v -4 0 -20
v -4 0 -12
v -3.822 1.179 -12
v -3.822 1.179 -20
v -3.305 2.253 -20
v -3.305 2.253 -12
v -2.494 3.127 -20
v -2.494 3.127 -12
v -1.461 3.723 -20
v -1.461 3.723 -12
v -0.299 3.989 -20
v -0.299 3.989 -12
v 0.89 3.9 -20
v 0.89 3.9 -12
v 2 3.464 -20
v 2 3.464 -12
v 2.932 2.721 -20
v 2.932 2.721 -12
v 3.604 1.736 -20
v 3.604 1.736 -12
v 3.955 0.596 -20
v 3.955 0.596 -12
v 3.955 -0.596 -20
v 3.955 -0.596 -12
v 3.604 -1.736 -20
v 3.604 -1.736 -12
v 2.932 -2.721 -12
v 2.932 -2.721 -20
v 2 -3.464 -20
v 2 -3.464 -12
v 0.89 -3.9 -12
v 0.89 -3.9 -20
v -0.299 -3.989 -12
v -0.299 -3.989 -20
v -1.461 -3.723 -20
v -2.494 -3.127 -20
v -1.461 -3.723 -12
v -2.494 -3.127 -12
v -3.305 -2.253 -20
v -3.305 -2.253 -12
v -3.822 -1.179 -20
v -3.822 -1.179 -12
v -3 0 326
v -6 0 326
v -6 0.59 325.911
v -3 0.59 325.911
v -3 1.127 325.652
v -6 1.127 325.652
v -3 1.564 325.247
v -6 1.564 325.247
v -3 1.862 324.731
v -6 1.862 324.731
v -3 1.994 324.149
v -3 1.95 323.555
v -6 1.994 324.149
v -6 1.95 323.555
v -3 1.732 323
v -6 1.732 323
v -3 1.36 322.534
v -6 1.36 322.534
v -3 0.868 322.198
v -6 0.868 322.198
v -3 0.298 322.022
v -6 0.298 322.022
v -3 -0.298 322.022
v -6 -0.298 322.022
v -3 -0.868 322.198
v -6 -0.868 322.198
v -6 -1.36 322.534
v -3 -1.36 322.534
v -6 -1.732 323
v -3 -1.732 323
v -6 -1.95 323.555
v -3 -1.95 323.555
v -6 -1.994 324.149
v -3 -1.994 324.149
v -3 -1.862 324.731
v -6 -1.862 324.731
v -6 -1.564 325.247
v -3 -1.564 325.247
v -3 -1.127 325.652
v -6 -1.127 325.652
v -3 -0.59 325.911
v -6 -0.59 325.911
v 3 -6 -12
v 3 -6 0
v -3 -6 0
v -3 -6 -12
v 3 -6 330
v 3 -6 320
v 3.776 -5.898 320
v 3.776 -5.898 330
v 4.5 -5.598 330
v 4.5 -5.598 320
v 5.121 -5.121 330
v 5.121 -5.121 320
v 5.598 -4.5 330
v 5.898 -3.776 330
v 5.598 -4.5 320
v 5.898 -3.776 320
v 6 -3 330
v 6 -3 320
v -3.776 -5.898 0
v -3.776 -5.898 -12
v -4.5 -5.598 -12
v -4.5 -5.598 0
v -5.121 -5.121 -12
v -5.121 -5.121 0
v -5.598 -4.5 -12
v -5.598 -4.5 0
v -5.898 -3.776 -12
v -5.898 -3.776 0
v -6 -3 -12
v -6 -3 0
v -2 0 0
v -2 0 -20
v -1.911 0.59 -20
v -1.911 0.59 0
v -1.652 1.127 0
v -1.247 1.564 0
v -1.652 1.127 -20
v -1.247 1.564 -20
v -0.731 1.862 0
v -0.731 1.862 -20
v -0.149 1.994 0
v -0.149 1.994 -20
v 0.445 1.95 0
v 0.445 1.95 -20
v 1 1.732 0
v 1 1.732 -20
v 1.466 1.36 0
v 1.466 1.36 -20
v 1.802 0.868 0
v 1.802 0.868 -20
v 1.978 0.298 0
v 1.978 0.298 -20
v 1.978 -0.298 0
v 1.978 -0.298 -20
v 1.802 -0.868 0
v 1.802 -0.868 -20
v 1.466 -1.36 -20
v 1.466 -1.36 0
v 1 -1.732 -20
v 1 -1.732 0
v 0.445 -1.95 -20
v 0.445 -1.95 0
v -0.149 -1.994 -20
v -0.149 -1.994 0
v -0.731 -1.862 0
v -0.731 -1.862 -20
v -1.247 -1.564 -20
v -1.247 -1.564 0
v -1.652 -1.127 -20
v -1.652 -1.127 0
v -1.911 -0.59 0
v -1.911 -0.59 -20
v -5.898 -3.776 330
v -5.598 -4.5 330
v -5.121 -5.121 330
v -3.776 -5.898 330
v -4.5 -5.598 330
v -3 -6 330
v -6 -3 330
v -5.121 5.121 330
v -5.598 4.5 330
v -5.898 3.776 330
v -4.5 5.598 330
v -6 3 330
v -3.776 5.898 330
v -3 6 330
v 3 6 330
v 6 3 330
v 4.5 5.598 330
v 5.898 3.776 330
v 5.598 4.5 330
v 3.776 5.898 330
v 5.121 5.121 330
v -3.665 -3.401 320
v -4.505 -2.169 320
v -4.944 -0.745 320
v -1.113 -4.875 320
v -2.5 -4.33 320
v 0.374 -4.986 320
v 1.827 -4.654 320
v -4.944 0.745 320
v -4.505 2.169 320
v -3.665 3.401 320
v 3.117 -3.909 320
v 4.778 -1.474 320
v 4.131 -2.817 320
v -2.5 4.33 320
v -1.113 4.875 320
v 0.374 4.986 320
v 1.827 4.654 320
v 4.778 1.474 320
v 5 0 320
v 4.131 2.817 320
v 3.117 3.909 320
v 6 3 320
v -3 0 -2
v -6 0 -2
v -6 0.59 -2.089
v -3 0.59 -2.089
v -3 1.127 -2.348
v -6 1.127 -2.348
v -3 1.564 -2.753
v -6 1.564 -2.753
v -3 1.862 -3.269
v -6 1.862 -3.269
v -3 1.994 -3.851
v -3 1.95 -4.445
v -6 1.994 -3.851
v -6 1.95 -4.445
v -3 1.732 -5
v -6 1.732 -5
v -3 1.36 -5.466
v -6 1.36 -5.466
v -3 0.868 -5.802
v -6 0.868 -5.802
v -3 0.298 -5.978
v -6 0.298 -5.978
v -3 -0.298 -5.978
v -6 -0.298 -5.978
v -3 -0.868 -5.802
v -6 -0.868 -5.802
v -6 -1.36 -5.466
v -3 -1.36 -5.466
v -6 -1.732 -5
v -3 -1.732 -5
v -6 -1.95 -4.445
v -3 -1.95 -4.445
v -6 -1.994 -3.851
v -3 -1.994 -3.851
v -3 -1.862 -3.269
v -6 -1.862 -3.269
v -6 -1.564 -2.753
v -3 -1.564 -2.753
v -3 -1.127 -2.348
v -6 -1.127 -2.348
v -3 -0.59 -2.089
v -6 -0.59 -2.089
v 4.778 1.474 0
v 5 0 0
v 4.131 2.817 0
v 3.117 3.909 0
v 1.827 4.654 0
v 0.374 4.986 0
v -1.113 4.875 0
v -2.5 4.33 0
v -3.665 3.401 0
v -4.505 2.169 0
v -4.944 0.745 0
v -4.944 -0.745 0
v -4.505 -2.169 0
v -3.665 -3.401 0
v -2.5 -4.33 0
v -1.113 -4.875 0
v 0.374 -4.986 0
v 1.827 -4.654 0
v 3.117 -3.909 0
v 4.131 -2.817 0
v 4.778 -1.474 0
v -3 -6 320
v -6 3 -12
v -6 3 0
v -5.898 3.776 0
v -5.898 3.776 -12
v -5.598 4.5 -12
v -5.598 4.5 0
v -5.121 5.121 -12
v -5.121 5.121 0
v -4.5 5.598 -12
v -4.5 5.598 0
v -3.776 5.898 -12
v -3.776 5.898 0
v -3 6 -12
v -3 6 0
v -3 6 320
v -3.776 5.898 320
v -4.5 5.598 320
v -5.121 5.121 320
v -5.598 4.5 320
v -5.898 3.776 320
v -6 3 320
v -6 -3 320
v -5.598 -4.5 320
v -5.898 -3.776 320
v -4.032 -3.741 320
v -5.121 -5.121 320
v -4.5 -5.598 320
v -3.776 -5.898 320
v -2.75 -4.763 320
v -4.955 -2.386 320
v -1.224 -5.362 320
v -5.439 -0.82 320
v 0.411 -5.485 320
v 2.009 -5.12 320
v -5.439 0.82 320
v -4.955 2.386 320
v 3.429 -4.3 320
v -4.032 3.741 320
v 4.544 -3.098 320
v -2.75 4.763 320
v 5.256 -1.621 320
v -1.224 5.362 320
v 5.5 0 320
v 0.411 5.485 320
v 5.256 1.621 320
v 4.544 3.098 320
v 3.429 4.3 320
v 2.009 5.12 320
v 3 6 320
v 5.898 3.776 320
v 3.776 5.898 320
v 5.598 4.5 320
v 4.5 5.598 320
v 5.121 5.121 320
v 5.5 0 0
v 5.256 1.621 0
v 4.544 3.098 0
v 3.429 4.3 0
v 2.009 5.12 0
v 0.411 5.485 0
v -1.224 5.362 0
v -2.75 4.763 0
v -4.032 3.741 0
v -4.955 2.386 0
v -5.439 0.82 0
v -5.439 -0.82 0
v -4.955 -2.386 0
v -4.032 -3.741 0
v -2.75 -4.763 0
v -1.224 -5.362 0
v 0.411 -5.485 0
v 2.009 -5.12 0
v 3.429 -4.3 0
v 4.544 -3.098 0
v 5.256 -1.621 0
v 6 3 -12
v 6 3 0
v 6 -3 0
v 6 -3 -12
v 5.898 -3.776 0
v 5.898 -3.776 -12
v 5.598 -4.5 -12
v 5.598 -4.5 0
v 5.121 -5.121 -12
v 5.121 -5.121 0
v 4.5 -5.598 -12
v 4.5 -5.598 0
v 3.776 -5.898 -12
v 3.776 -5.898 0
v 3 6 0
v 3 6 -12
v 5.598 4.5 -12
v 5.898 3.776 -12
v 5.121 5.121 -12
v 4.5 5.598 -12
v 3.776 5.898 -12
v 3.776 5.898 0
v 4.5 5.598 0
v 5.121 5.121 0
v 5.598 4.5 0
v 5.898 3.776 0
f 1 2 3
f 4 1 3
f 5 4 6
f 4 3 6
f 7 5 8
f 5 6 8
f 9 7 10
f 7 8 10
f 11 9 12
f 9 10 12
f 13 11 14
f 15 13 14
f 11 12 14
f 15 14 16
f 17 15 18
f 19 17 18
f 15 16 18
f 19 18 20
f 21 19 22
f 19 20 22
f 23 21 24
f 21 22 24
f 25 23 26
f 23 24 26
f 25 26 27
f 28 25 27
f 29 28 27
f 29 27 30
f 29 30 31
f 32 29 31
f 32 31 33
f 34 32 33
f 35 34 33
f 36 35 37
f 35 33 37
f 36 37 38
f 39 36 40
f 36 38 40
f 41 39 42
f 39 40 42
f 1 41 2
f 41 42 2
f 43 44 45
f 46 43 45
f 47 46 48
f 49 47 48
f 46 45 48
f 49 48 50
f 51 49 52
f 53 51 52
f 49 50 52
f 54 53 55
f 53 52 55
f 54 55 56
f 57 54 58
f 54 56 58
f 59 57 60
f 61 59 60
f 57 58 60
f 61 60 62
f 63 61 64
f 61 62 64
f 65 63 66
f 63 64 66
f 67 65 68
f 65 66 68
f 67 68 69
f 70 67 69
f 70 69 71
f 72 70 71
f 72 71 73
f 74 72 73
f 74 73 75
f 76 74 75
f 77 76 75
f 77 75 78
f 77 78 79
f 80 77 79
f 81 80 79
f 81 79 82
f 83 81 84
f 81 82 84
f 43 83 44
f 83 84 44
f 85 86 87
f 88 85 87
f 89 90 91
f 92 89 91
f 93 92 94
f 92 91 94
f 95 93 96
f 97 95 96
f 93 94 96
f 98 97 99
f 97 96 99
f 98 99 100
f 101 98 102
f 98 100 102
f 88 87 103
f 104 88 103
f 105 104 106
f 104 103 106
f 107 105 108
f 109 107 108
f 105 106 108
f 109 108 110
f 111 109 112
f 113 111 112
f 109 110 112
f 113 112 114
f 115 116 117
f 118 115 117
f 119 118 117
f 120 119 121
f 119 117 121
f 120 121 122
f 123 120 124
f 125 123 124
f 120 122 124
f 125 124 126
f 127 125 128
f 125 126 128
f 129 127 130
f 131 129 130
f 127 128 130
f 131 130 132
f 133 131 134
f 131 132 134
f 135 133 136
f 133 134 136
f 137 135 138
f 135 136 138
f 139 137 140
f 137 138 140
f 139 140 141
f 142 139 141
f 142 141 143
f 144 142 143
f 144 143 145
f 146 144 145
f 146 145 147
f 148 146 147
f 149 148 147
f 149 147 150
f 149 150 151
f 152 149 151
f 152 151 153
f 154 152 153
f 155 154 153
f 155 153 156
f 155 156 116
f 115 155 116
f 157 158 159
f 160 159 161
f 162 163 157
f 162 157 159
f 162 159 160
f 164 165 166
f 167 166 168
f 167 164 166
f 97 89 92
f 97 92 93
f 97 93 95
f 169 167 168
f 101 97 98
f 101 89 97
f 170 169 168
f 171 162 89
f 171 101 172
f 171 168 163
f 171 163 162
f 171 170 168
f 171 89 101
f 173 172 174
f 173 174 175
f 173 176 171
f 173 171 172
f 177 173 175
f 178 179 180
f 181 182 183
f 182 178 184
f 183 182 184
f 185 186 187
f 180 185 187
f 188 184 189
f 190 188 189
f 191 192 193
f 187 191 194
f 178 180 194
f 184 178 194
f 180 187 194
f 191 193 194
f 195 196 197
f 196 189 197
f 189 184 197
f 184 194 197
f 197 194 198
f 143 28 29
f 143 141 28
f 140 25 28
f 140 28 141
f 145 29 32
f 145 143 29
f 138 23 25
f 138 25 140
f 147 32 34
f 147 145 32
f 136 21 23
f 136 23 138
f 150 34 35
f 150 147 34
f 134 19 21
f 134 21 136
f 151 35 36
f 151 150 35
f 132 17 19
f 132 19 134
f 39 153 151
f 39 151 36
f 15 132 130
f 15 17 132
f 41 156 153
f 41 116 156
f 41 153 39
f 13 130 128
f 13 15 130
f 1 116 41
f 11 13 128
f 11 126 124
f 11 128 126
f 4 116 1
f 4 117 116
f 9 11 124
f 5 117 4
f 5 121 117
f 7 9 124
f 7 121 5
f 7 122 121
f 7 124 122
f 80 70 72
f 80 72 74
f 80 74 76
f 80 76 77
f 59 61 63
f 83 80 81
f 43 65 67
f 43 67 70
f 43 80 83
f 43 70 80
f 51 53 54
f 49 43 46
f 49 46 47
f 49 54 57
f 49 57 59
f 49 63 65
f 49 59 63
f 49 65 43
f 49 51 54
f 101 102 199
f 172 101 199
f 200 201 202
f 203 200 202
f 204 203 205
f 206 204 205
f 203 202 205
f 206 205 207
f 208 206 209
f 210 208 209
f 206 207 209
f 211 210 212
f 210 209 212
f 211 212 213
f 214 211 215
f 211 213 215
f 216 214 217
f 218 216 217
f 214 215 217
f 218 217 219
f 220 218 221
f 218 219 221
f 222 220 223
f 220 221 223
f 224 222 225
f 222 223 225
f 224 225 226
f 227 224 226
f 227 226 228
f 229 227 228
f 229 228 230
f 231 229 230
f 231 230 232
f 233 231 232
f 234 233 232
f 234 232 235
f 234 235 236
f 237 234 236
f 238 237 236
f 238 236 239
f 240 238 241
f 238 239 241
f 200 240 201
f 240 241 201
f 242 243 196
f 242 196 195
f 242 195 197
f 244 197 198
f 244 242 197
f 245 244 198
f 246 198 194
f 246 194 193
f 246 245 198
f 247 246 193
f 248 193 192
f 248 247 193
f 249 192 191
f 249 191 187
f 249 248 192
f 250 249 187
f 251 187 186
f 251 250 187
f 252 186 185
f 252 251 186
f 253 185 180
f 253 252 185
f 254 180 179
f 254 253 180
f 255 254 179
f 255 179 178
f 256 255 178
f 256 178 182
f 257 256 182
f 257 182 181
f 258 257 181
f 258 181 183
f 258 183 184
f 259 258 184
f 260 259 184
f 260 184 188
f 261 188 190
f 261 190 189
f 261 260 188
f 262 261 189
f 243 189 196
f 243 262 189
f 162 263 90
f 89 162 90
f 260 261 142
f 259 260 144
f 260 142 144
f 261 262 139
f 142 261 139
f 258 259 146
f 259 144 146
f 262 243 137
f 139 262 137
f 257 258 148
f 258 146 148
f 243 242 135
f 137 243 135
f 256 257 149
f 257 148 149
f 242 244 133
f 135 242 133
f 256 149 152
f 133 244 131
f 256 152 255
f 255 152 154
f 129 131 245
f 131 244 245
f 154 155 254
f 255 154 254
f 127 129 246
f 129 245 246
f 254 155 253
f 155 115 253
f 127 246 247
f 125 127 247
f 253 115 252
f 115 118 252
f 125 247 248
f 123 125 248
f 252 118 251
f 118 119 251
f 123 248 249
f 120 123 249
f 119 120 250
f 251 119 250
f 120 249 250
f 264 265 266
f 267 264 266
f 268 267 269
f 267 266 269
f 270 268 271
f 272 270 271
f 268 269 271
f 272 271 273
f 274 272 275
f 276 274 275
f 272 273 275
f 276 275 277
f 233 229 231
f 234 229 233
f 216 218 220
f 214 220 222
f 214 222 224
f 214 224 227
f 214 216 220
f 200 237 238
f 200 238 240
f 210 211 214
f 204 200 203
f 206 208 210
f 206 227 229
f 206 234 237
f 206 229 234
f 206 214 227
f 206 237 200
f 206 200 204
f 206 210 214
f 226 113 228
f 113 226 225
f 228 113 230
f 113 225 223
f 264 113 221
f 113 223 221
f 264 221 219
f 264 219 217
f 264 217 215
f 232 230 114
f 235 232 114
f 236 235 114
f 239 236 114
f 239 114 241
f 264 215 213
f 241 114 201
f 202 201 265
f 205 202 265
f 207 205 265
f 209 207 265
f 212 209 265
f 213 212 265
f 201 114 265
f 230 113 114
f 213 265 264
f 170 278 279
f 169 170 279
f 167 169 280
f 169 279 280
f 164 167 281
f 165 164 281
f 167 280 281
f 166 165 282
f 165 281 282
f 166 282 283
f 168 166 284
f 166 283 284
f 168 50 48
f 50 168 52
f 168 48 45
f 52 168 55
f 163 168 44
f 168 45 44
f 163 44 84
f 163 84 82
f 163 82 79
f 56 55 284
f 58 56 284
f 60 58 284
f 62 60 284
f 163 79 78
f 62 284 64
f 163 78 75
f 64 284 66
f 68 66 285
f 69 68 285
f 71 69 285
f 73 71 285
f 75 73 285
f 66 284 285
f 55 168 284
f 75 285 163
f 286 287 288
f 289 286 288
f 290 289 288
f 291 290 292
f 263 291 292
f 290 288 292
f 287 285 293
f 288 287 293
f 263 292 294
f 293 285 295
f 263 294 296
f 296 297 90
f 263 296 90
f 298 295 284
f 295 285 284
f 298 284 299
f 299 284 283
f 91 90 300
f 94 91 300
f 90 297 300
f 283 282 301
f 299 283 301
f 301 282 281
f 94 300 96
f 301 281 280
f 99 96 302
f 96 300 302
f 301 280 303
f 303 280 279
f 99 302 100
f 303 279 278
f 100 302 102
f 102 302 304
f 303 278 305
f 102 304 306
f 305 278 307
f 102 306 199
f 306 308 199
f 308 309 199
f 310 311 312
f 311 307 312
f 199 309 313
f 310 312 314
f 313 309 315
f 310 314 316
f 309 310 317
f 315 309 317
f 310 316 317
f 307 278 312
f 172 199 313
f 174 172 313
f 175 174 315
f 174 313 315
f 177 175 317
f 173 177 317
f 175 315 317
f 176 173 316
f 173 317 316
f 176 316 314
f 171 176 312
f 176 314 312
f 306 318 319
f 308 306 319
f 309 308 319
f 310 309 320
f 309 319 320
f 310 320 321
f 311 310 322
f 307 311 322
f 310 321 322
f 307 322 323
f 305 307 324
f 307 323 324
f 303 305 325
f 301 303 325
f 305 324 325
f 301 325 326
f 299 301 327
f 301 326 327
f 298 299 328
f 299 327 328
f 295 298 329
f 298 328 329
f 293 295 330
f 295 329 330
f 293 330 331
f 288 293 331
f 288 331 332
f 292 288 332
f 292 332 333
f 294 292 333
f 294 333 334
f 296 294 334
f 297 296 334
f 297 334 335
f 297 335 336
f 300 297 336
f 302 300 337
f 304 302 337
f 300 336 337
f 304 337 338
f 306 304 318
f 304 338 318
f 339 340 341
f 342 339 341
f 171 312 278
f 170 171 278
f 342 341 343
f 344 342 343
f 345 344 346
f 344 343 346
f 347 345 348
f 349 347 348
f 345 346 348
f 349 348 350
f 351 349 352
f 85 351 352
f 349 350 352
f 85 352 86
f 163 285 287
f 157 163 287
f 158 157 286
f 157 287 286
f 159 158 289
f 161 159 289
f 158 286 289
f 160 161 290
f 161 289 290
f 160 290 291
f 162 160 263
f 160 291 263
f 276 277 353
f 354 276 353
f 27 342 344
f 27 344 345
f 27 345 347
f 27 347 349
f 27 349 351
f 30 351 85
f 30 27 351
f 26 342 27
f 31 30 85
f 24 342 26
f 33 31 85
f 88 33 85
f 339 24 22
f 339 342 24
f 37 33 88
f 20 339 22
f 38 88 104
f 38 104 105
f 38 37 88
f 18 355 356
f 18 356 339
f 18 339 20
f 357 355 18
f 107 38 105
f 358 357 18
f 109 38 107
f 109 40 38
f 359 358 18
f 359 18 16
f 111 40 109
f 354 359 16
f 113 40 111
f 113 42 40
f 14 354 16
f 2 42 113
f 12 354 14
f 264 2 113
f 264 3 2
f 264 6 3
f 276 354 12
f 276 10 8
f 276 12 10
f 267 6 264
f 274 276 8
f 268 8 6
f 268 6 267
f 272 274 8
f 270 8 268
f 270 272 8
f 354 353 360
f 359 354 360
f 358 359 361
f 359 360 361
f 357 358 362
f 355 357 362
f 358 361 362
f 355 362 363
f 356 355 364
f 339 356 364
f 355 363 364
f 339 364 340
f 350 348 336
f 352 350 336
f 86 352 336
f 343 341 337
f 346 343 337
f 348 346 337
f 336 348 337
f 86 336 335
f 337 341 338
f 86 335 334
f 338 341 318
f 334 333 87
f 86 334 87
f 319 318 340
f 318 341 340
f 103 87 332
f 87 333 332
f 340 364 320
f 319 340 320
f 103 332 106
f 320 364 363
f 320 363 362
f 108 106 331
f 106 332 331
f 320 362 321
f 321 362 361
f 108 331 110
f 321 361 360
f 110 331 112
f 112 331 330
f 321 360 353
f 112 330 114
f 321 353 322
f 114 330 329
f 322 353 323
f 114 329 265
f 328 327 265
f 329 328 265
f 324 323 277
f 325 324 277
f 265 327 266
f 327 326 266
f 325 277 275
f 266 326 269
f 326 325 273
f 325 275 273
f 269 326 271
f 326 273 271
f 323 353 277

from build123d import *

# Parameters (mm, degrees)
SKETCH_1_R          = 5.5
SKETCH_1_R_2        = 5
EXTRUDE_1_DEPTH     = 320
EXTRUDE_2_DEPTH     = 10
EXTRUDE_3_DEPTH     = 12
SKETCH_4_R          = 4
EXTRUDE_4_DEPTH     = 8
SKETCH_5_R          = 2
CUT_EXTRUDE_1_DEPTH = 38
SKETCH_6_R          = 2
CUT_EXTRUDE_3_DEPTH = 3


with BuildPart() as part:
    # 草图1 → 凸台-拉伸1 (new body)
    with BuildSketch(Plane.XY):
        Circle(SKETCH_1_R)
        Circle(SKETCH_1_R_2, mode=Mode.SUBTRACT)
    extrude(amount=EXTRUDE_1_DEPTH)

    # 草图2 → 凸台-拉伸2 (add)
    with BuildSketch(Plane.XY.offset(320)):
        with BuildLine():
            Line((-3, -6), (3, -6))
            ThreePointArc((3, -6), (5.121320344, -5.121320344), (6, -3))
            Line((6, -3), (6, 3))
            ThreePointArc((6, 3), (5.121320344, 5.121320344), (3, 6))
            Line((3, 6), (-3, 6))
            ThreePointArc((-3, 6), (-5.121320344, 5.121320344), (-6, 3))
            Line((-6, 3), (-6, -3))
            ThreePointArc((-6, -3), (-5.121320344, -5.121320344), (-3, -6))
        make_face()
    extrude(amount=EXTRUDE_2_DEPTH)

    # 草图3 → 凸台-拉伸3 (add)
    with BuildSketch(Plane(origin=(0, 0, 0), x_dir=(-1, 0, 0), z_dir=(0, 0, -1))):
        with BuildLine():
            Line((-3, -6), (3, -6))
            ThreePointArc((3, -6), (5.121320344, -5.121320344), (6, -3))
            Line((6, -3), (6, 3))
            ThreePointArc((6, 3), (5.121320344, 5.121320344), (3, 6))
            Line((3, 6), (-3, 6))
            ThreePointArc((-3, 6), (-5.121320344, 5.121320344), (-6, 3))
            Line((-6, 3), (-6, -3))
            ThreePointArc((-6, -3), (-5.121320344, -5.121320344), (-3, -6))
        make_face()
    extrude(amount=EXTRUDE_3_DEPTH)

    # 草图4 → 凸台-拉伸4 (add)
    with BuildSketch(Plane(origin=(0, 0, -12), x_dir=(-1, 0, 0), z_dir=(0, 0, -1))):
        Circle(SKETCH_4_R)
    extrude(amount=EXTRUDE_4_DEPTH)

    # 草图5 → 切除-拉伸1 (cut)
    with BuildSketch(Plane(origin=(0, 0, -20), x_dir=(-1, 0, 0), z_dir=(0, 0, -1))):
        Circle(SKETCH_5_R)
    extrude(amount=-CUT_EXTRUDE_1_DEPTH, mode=Mode.SUBTRACT)

    # 草图6 → 切除-拉伸3 (cut)
    with BuildSketch(Plane.ZY.offset(6)):
        with Locations((-4, 0)):
            Circle(SKETCH_6_R)
        with Locations((324, 0)):
            Circle(SKETCH_6_R)
    extrude(amount=-CUT_EXTRUDE_3_DEPTH, mode=Mode.SUBTRACT)


solid = part.part
